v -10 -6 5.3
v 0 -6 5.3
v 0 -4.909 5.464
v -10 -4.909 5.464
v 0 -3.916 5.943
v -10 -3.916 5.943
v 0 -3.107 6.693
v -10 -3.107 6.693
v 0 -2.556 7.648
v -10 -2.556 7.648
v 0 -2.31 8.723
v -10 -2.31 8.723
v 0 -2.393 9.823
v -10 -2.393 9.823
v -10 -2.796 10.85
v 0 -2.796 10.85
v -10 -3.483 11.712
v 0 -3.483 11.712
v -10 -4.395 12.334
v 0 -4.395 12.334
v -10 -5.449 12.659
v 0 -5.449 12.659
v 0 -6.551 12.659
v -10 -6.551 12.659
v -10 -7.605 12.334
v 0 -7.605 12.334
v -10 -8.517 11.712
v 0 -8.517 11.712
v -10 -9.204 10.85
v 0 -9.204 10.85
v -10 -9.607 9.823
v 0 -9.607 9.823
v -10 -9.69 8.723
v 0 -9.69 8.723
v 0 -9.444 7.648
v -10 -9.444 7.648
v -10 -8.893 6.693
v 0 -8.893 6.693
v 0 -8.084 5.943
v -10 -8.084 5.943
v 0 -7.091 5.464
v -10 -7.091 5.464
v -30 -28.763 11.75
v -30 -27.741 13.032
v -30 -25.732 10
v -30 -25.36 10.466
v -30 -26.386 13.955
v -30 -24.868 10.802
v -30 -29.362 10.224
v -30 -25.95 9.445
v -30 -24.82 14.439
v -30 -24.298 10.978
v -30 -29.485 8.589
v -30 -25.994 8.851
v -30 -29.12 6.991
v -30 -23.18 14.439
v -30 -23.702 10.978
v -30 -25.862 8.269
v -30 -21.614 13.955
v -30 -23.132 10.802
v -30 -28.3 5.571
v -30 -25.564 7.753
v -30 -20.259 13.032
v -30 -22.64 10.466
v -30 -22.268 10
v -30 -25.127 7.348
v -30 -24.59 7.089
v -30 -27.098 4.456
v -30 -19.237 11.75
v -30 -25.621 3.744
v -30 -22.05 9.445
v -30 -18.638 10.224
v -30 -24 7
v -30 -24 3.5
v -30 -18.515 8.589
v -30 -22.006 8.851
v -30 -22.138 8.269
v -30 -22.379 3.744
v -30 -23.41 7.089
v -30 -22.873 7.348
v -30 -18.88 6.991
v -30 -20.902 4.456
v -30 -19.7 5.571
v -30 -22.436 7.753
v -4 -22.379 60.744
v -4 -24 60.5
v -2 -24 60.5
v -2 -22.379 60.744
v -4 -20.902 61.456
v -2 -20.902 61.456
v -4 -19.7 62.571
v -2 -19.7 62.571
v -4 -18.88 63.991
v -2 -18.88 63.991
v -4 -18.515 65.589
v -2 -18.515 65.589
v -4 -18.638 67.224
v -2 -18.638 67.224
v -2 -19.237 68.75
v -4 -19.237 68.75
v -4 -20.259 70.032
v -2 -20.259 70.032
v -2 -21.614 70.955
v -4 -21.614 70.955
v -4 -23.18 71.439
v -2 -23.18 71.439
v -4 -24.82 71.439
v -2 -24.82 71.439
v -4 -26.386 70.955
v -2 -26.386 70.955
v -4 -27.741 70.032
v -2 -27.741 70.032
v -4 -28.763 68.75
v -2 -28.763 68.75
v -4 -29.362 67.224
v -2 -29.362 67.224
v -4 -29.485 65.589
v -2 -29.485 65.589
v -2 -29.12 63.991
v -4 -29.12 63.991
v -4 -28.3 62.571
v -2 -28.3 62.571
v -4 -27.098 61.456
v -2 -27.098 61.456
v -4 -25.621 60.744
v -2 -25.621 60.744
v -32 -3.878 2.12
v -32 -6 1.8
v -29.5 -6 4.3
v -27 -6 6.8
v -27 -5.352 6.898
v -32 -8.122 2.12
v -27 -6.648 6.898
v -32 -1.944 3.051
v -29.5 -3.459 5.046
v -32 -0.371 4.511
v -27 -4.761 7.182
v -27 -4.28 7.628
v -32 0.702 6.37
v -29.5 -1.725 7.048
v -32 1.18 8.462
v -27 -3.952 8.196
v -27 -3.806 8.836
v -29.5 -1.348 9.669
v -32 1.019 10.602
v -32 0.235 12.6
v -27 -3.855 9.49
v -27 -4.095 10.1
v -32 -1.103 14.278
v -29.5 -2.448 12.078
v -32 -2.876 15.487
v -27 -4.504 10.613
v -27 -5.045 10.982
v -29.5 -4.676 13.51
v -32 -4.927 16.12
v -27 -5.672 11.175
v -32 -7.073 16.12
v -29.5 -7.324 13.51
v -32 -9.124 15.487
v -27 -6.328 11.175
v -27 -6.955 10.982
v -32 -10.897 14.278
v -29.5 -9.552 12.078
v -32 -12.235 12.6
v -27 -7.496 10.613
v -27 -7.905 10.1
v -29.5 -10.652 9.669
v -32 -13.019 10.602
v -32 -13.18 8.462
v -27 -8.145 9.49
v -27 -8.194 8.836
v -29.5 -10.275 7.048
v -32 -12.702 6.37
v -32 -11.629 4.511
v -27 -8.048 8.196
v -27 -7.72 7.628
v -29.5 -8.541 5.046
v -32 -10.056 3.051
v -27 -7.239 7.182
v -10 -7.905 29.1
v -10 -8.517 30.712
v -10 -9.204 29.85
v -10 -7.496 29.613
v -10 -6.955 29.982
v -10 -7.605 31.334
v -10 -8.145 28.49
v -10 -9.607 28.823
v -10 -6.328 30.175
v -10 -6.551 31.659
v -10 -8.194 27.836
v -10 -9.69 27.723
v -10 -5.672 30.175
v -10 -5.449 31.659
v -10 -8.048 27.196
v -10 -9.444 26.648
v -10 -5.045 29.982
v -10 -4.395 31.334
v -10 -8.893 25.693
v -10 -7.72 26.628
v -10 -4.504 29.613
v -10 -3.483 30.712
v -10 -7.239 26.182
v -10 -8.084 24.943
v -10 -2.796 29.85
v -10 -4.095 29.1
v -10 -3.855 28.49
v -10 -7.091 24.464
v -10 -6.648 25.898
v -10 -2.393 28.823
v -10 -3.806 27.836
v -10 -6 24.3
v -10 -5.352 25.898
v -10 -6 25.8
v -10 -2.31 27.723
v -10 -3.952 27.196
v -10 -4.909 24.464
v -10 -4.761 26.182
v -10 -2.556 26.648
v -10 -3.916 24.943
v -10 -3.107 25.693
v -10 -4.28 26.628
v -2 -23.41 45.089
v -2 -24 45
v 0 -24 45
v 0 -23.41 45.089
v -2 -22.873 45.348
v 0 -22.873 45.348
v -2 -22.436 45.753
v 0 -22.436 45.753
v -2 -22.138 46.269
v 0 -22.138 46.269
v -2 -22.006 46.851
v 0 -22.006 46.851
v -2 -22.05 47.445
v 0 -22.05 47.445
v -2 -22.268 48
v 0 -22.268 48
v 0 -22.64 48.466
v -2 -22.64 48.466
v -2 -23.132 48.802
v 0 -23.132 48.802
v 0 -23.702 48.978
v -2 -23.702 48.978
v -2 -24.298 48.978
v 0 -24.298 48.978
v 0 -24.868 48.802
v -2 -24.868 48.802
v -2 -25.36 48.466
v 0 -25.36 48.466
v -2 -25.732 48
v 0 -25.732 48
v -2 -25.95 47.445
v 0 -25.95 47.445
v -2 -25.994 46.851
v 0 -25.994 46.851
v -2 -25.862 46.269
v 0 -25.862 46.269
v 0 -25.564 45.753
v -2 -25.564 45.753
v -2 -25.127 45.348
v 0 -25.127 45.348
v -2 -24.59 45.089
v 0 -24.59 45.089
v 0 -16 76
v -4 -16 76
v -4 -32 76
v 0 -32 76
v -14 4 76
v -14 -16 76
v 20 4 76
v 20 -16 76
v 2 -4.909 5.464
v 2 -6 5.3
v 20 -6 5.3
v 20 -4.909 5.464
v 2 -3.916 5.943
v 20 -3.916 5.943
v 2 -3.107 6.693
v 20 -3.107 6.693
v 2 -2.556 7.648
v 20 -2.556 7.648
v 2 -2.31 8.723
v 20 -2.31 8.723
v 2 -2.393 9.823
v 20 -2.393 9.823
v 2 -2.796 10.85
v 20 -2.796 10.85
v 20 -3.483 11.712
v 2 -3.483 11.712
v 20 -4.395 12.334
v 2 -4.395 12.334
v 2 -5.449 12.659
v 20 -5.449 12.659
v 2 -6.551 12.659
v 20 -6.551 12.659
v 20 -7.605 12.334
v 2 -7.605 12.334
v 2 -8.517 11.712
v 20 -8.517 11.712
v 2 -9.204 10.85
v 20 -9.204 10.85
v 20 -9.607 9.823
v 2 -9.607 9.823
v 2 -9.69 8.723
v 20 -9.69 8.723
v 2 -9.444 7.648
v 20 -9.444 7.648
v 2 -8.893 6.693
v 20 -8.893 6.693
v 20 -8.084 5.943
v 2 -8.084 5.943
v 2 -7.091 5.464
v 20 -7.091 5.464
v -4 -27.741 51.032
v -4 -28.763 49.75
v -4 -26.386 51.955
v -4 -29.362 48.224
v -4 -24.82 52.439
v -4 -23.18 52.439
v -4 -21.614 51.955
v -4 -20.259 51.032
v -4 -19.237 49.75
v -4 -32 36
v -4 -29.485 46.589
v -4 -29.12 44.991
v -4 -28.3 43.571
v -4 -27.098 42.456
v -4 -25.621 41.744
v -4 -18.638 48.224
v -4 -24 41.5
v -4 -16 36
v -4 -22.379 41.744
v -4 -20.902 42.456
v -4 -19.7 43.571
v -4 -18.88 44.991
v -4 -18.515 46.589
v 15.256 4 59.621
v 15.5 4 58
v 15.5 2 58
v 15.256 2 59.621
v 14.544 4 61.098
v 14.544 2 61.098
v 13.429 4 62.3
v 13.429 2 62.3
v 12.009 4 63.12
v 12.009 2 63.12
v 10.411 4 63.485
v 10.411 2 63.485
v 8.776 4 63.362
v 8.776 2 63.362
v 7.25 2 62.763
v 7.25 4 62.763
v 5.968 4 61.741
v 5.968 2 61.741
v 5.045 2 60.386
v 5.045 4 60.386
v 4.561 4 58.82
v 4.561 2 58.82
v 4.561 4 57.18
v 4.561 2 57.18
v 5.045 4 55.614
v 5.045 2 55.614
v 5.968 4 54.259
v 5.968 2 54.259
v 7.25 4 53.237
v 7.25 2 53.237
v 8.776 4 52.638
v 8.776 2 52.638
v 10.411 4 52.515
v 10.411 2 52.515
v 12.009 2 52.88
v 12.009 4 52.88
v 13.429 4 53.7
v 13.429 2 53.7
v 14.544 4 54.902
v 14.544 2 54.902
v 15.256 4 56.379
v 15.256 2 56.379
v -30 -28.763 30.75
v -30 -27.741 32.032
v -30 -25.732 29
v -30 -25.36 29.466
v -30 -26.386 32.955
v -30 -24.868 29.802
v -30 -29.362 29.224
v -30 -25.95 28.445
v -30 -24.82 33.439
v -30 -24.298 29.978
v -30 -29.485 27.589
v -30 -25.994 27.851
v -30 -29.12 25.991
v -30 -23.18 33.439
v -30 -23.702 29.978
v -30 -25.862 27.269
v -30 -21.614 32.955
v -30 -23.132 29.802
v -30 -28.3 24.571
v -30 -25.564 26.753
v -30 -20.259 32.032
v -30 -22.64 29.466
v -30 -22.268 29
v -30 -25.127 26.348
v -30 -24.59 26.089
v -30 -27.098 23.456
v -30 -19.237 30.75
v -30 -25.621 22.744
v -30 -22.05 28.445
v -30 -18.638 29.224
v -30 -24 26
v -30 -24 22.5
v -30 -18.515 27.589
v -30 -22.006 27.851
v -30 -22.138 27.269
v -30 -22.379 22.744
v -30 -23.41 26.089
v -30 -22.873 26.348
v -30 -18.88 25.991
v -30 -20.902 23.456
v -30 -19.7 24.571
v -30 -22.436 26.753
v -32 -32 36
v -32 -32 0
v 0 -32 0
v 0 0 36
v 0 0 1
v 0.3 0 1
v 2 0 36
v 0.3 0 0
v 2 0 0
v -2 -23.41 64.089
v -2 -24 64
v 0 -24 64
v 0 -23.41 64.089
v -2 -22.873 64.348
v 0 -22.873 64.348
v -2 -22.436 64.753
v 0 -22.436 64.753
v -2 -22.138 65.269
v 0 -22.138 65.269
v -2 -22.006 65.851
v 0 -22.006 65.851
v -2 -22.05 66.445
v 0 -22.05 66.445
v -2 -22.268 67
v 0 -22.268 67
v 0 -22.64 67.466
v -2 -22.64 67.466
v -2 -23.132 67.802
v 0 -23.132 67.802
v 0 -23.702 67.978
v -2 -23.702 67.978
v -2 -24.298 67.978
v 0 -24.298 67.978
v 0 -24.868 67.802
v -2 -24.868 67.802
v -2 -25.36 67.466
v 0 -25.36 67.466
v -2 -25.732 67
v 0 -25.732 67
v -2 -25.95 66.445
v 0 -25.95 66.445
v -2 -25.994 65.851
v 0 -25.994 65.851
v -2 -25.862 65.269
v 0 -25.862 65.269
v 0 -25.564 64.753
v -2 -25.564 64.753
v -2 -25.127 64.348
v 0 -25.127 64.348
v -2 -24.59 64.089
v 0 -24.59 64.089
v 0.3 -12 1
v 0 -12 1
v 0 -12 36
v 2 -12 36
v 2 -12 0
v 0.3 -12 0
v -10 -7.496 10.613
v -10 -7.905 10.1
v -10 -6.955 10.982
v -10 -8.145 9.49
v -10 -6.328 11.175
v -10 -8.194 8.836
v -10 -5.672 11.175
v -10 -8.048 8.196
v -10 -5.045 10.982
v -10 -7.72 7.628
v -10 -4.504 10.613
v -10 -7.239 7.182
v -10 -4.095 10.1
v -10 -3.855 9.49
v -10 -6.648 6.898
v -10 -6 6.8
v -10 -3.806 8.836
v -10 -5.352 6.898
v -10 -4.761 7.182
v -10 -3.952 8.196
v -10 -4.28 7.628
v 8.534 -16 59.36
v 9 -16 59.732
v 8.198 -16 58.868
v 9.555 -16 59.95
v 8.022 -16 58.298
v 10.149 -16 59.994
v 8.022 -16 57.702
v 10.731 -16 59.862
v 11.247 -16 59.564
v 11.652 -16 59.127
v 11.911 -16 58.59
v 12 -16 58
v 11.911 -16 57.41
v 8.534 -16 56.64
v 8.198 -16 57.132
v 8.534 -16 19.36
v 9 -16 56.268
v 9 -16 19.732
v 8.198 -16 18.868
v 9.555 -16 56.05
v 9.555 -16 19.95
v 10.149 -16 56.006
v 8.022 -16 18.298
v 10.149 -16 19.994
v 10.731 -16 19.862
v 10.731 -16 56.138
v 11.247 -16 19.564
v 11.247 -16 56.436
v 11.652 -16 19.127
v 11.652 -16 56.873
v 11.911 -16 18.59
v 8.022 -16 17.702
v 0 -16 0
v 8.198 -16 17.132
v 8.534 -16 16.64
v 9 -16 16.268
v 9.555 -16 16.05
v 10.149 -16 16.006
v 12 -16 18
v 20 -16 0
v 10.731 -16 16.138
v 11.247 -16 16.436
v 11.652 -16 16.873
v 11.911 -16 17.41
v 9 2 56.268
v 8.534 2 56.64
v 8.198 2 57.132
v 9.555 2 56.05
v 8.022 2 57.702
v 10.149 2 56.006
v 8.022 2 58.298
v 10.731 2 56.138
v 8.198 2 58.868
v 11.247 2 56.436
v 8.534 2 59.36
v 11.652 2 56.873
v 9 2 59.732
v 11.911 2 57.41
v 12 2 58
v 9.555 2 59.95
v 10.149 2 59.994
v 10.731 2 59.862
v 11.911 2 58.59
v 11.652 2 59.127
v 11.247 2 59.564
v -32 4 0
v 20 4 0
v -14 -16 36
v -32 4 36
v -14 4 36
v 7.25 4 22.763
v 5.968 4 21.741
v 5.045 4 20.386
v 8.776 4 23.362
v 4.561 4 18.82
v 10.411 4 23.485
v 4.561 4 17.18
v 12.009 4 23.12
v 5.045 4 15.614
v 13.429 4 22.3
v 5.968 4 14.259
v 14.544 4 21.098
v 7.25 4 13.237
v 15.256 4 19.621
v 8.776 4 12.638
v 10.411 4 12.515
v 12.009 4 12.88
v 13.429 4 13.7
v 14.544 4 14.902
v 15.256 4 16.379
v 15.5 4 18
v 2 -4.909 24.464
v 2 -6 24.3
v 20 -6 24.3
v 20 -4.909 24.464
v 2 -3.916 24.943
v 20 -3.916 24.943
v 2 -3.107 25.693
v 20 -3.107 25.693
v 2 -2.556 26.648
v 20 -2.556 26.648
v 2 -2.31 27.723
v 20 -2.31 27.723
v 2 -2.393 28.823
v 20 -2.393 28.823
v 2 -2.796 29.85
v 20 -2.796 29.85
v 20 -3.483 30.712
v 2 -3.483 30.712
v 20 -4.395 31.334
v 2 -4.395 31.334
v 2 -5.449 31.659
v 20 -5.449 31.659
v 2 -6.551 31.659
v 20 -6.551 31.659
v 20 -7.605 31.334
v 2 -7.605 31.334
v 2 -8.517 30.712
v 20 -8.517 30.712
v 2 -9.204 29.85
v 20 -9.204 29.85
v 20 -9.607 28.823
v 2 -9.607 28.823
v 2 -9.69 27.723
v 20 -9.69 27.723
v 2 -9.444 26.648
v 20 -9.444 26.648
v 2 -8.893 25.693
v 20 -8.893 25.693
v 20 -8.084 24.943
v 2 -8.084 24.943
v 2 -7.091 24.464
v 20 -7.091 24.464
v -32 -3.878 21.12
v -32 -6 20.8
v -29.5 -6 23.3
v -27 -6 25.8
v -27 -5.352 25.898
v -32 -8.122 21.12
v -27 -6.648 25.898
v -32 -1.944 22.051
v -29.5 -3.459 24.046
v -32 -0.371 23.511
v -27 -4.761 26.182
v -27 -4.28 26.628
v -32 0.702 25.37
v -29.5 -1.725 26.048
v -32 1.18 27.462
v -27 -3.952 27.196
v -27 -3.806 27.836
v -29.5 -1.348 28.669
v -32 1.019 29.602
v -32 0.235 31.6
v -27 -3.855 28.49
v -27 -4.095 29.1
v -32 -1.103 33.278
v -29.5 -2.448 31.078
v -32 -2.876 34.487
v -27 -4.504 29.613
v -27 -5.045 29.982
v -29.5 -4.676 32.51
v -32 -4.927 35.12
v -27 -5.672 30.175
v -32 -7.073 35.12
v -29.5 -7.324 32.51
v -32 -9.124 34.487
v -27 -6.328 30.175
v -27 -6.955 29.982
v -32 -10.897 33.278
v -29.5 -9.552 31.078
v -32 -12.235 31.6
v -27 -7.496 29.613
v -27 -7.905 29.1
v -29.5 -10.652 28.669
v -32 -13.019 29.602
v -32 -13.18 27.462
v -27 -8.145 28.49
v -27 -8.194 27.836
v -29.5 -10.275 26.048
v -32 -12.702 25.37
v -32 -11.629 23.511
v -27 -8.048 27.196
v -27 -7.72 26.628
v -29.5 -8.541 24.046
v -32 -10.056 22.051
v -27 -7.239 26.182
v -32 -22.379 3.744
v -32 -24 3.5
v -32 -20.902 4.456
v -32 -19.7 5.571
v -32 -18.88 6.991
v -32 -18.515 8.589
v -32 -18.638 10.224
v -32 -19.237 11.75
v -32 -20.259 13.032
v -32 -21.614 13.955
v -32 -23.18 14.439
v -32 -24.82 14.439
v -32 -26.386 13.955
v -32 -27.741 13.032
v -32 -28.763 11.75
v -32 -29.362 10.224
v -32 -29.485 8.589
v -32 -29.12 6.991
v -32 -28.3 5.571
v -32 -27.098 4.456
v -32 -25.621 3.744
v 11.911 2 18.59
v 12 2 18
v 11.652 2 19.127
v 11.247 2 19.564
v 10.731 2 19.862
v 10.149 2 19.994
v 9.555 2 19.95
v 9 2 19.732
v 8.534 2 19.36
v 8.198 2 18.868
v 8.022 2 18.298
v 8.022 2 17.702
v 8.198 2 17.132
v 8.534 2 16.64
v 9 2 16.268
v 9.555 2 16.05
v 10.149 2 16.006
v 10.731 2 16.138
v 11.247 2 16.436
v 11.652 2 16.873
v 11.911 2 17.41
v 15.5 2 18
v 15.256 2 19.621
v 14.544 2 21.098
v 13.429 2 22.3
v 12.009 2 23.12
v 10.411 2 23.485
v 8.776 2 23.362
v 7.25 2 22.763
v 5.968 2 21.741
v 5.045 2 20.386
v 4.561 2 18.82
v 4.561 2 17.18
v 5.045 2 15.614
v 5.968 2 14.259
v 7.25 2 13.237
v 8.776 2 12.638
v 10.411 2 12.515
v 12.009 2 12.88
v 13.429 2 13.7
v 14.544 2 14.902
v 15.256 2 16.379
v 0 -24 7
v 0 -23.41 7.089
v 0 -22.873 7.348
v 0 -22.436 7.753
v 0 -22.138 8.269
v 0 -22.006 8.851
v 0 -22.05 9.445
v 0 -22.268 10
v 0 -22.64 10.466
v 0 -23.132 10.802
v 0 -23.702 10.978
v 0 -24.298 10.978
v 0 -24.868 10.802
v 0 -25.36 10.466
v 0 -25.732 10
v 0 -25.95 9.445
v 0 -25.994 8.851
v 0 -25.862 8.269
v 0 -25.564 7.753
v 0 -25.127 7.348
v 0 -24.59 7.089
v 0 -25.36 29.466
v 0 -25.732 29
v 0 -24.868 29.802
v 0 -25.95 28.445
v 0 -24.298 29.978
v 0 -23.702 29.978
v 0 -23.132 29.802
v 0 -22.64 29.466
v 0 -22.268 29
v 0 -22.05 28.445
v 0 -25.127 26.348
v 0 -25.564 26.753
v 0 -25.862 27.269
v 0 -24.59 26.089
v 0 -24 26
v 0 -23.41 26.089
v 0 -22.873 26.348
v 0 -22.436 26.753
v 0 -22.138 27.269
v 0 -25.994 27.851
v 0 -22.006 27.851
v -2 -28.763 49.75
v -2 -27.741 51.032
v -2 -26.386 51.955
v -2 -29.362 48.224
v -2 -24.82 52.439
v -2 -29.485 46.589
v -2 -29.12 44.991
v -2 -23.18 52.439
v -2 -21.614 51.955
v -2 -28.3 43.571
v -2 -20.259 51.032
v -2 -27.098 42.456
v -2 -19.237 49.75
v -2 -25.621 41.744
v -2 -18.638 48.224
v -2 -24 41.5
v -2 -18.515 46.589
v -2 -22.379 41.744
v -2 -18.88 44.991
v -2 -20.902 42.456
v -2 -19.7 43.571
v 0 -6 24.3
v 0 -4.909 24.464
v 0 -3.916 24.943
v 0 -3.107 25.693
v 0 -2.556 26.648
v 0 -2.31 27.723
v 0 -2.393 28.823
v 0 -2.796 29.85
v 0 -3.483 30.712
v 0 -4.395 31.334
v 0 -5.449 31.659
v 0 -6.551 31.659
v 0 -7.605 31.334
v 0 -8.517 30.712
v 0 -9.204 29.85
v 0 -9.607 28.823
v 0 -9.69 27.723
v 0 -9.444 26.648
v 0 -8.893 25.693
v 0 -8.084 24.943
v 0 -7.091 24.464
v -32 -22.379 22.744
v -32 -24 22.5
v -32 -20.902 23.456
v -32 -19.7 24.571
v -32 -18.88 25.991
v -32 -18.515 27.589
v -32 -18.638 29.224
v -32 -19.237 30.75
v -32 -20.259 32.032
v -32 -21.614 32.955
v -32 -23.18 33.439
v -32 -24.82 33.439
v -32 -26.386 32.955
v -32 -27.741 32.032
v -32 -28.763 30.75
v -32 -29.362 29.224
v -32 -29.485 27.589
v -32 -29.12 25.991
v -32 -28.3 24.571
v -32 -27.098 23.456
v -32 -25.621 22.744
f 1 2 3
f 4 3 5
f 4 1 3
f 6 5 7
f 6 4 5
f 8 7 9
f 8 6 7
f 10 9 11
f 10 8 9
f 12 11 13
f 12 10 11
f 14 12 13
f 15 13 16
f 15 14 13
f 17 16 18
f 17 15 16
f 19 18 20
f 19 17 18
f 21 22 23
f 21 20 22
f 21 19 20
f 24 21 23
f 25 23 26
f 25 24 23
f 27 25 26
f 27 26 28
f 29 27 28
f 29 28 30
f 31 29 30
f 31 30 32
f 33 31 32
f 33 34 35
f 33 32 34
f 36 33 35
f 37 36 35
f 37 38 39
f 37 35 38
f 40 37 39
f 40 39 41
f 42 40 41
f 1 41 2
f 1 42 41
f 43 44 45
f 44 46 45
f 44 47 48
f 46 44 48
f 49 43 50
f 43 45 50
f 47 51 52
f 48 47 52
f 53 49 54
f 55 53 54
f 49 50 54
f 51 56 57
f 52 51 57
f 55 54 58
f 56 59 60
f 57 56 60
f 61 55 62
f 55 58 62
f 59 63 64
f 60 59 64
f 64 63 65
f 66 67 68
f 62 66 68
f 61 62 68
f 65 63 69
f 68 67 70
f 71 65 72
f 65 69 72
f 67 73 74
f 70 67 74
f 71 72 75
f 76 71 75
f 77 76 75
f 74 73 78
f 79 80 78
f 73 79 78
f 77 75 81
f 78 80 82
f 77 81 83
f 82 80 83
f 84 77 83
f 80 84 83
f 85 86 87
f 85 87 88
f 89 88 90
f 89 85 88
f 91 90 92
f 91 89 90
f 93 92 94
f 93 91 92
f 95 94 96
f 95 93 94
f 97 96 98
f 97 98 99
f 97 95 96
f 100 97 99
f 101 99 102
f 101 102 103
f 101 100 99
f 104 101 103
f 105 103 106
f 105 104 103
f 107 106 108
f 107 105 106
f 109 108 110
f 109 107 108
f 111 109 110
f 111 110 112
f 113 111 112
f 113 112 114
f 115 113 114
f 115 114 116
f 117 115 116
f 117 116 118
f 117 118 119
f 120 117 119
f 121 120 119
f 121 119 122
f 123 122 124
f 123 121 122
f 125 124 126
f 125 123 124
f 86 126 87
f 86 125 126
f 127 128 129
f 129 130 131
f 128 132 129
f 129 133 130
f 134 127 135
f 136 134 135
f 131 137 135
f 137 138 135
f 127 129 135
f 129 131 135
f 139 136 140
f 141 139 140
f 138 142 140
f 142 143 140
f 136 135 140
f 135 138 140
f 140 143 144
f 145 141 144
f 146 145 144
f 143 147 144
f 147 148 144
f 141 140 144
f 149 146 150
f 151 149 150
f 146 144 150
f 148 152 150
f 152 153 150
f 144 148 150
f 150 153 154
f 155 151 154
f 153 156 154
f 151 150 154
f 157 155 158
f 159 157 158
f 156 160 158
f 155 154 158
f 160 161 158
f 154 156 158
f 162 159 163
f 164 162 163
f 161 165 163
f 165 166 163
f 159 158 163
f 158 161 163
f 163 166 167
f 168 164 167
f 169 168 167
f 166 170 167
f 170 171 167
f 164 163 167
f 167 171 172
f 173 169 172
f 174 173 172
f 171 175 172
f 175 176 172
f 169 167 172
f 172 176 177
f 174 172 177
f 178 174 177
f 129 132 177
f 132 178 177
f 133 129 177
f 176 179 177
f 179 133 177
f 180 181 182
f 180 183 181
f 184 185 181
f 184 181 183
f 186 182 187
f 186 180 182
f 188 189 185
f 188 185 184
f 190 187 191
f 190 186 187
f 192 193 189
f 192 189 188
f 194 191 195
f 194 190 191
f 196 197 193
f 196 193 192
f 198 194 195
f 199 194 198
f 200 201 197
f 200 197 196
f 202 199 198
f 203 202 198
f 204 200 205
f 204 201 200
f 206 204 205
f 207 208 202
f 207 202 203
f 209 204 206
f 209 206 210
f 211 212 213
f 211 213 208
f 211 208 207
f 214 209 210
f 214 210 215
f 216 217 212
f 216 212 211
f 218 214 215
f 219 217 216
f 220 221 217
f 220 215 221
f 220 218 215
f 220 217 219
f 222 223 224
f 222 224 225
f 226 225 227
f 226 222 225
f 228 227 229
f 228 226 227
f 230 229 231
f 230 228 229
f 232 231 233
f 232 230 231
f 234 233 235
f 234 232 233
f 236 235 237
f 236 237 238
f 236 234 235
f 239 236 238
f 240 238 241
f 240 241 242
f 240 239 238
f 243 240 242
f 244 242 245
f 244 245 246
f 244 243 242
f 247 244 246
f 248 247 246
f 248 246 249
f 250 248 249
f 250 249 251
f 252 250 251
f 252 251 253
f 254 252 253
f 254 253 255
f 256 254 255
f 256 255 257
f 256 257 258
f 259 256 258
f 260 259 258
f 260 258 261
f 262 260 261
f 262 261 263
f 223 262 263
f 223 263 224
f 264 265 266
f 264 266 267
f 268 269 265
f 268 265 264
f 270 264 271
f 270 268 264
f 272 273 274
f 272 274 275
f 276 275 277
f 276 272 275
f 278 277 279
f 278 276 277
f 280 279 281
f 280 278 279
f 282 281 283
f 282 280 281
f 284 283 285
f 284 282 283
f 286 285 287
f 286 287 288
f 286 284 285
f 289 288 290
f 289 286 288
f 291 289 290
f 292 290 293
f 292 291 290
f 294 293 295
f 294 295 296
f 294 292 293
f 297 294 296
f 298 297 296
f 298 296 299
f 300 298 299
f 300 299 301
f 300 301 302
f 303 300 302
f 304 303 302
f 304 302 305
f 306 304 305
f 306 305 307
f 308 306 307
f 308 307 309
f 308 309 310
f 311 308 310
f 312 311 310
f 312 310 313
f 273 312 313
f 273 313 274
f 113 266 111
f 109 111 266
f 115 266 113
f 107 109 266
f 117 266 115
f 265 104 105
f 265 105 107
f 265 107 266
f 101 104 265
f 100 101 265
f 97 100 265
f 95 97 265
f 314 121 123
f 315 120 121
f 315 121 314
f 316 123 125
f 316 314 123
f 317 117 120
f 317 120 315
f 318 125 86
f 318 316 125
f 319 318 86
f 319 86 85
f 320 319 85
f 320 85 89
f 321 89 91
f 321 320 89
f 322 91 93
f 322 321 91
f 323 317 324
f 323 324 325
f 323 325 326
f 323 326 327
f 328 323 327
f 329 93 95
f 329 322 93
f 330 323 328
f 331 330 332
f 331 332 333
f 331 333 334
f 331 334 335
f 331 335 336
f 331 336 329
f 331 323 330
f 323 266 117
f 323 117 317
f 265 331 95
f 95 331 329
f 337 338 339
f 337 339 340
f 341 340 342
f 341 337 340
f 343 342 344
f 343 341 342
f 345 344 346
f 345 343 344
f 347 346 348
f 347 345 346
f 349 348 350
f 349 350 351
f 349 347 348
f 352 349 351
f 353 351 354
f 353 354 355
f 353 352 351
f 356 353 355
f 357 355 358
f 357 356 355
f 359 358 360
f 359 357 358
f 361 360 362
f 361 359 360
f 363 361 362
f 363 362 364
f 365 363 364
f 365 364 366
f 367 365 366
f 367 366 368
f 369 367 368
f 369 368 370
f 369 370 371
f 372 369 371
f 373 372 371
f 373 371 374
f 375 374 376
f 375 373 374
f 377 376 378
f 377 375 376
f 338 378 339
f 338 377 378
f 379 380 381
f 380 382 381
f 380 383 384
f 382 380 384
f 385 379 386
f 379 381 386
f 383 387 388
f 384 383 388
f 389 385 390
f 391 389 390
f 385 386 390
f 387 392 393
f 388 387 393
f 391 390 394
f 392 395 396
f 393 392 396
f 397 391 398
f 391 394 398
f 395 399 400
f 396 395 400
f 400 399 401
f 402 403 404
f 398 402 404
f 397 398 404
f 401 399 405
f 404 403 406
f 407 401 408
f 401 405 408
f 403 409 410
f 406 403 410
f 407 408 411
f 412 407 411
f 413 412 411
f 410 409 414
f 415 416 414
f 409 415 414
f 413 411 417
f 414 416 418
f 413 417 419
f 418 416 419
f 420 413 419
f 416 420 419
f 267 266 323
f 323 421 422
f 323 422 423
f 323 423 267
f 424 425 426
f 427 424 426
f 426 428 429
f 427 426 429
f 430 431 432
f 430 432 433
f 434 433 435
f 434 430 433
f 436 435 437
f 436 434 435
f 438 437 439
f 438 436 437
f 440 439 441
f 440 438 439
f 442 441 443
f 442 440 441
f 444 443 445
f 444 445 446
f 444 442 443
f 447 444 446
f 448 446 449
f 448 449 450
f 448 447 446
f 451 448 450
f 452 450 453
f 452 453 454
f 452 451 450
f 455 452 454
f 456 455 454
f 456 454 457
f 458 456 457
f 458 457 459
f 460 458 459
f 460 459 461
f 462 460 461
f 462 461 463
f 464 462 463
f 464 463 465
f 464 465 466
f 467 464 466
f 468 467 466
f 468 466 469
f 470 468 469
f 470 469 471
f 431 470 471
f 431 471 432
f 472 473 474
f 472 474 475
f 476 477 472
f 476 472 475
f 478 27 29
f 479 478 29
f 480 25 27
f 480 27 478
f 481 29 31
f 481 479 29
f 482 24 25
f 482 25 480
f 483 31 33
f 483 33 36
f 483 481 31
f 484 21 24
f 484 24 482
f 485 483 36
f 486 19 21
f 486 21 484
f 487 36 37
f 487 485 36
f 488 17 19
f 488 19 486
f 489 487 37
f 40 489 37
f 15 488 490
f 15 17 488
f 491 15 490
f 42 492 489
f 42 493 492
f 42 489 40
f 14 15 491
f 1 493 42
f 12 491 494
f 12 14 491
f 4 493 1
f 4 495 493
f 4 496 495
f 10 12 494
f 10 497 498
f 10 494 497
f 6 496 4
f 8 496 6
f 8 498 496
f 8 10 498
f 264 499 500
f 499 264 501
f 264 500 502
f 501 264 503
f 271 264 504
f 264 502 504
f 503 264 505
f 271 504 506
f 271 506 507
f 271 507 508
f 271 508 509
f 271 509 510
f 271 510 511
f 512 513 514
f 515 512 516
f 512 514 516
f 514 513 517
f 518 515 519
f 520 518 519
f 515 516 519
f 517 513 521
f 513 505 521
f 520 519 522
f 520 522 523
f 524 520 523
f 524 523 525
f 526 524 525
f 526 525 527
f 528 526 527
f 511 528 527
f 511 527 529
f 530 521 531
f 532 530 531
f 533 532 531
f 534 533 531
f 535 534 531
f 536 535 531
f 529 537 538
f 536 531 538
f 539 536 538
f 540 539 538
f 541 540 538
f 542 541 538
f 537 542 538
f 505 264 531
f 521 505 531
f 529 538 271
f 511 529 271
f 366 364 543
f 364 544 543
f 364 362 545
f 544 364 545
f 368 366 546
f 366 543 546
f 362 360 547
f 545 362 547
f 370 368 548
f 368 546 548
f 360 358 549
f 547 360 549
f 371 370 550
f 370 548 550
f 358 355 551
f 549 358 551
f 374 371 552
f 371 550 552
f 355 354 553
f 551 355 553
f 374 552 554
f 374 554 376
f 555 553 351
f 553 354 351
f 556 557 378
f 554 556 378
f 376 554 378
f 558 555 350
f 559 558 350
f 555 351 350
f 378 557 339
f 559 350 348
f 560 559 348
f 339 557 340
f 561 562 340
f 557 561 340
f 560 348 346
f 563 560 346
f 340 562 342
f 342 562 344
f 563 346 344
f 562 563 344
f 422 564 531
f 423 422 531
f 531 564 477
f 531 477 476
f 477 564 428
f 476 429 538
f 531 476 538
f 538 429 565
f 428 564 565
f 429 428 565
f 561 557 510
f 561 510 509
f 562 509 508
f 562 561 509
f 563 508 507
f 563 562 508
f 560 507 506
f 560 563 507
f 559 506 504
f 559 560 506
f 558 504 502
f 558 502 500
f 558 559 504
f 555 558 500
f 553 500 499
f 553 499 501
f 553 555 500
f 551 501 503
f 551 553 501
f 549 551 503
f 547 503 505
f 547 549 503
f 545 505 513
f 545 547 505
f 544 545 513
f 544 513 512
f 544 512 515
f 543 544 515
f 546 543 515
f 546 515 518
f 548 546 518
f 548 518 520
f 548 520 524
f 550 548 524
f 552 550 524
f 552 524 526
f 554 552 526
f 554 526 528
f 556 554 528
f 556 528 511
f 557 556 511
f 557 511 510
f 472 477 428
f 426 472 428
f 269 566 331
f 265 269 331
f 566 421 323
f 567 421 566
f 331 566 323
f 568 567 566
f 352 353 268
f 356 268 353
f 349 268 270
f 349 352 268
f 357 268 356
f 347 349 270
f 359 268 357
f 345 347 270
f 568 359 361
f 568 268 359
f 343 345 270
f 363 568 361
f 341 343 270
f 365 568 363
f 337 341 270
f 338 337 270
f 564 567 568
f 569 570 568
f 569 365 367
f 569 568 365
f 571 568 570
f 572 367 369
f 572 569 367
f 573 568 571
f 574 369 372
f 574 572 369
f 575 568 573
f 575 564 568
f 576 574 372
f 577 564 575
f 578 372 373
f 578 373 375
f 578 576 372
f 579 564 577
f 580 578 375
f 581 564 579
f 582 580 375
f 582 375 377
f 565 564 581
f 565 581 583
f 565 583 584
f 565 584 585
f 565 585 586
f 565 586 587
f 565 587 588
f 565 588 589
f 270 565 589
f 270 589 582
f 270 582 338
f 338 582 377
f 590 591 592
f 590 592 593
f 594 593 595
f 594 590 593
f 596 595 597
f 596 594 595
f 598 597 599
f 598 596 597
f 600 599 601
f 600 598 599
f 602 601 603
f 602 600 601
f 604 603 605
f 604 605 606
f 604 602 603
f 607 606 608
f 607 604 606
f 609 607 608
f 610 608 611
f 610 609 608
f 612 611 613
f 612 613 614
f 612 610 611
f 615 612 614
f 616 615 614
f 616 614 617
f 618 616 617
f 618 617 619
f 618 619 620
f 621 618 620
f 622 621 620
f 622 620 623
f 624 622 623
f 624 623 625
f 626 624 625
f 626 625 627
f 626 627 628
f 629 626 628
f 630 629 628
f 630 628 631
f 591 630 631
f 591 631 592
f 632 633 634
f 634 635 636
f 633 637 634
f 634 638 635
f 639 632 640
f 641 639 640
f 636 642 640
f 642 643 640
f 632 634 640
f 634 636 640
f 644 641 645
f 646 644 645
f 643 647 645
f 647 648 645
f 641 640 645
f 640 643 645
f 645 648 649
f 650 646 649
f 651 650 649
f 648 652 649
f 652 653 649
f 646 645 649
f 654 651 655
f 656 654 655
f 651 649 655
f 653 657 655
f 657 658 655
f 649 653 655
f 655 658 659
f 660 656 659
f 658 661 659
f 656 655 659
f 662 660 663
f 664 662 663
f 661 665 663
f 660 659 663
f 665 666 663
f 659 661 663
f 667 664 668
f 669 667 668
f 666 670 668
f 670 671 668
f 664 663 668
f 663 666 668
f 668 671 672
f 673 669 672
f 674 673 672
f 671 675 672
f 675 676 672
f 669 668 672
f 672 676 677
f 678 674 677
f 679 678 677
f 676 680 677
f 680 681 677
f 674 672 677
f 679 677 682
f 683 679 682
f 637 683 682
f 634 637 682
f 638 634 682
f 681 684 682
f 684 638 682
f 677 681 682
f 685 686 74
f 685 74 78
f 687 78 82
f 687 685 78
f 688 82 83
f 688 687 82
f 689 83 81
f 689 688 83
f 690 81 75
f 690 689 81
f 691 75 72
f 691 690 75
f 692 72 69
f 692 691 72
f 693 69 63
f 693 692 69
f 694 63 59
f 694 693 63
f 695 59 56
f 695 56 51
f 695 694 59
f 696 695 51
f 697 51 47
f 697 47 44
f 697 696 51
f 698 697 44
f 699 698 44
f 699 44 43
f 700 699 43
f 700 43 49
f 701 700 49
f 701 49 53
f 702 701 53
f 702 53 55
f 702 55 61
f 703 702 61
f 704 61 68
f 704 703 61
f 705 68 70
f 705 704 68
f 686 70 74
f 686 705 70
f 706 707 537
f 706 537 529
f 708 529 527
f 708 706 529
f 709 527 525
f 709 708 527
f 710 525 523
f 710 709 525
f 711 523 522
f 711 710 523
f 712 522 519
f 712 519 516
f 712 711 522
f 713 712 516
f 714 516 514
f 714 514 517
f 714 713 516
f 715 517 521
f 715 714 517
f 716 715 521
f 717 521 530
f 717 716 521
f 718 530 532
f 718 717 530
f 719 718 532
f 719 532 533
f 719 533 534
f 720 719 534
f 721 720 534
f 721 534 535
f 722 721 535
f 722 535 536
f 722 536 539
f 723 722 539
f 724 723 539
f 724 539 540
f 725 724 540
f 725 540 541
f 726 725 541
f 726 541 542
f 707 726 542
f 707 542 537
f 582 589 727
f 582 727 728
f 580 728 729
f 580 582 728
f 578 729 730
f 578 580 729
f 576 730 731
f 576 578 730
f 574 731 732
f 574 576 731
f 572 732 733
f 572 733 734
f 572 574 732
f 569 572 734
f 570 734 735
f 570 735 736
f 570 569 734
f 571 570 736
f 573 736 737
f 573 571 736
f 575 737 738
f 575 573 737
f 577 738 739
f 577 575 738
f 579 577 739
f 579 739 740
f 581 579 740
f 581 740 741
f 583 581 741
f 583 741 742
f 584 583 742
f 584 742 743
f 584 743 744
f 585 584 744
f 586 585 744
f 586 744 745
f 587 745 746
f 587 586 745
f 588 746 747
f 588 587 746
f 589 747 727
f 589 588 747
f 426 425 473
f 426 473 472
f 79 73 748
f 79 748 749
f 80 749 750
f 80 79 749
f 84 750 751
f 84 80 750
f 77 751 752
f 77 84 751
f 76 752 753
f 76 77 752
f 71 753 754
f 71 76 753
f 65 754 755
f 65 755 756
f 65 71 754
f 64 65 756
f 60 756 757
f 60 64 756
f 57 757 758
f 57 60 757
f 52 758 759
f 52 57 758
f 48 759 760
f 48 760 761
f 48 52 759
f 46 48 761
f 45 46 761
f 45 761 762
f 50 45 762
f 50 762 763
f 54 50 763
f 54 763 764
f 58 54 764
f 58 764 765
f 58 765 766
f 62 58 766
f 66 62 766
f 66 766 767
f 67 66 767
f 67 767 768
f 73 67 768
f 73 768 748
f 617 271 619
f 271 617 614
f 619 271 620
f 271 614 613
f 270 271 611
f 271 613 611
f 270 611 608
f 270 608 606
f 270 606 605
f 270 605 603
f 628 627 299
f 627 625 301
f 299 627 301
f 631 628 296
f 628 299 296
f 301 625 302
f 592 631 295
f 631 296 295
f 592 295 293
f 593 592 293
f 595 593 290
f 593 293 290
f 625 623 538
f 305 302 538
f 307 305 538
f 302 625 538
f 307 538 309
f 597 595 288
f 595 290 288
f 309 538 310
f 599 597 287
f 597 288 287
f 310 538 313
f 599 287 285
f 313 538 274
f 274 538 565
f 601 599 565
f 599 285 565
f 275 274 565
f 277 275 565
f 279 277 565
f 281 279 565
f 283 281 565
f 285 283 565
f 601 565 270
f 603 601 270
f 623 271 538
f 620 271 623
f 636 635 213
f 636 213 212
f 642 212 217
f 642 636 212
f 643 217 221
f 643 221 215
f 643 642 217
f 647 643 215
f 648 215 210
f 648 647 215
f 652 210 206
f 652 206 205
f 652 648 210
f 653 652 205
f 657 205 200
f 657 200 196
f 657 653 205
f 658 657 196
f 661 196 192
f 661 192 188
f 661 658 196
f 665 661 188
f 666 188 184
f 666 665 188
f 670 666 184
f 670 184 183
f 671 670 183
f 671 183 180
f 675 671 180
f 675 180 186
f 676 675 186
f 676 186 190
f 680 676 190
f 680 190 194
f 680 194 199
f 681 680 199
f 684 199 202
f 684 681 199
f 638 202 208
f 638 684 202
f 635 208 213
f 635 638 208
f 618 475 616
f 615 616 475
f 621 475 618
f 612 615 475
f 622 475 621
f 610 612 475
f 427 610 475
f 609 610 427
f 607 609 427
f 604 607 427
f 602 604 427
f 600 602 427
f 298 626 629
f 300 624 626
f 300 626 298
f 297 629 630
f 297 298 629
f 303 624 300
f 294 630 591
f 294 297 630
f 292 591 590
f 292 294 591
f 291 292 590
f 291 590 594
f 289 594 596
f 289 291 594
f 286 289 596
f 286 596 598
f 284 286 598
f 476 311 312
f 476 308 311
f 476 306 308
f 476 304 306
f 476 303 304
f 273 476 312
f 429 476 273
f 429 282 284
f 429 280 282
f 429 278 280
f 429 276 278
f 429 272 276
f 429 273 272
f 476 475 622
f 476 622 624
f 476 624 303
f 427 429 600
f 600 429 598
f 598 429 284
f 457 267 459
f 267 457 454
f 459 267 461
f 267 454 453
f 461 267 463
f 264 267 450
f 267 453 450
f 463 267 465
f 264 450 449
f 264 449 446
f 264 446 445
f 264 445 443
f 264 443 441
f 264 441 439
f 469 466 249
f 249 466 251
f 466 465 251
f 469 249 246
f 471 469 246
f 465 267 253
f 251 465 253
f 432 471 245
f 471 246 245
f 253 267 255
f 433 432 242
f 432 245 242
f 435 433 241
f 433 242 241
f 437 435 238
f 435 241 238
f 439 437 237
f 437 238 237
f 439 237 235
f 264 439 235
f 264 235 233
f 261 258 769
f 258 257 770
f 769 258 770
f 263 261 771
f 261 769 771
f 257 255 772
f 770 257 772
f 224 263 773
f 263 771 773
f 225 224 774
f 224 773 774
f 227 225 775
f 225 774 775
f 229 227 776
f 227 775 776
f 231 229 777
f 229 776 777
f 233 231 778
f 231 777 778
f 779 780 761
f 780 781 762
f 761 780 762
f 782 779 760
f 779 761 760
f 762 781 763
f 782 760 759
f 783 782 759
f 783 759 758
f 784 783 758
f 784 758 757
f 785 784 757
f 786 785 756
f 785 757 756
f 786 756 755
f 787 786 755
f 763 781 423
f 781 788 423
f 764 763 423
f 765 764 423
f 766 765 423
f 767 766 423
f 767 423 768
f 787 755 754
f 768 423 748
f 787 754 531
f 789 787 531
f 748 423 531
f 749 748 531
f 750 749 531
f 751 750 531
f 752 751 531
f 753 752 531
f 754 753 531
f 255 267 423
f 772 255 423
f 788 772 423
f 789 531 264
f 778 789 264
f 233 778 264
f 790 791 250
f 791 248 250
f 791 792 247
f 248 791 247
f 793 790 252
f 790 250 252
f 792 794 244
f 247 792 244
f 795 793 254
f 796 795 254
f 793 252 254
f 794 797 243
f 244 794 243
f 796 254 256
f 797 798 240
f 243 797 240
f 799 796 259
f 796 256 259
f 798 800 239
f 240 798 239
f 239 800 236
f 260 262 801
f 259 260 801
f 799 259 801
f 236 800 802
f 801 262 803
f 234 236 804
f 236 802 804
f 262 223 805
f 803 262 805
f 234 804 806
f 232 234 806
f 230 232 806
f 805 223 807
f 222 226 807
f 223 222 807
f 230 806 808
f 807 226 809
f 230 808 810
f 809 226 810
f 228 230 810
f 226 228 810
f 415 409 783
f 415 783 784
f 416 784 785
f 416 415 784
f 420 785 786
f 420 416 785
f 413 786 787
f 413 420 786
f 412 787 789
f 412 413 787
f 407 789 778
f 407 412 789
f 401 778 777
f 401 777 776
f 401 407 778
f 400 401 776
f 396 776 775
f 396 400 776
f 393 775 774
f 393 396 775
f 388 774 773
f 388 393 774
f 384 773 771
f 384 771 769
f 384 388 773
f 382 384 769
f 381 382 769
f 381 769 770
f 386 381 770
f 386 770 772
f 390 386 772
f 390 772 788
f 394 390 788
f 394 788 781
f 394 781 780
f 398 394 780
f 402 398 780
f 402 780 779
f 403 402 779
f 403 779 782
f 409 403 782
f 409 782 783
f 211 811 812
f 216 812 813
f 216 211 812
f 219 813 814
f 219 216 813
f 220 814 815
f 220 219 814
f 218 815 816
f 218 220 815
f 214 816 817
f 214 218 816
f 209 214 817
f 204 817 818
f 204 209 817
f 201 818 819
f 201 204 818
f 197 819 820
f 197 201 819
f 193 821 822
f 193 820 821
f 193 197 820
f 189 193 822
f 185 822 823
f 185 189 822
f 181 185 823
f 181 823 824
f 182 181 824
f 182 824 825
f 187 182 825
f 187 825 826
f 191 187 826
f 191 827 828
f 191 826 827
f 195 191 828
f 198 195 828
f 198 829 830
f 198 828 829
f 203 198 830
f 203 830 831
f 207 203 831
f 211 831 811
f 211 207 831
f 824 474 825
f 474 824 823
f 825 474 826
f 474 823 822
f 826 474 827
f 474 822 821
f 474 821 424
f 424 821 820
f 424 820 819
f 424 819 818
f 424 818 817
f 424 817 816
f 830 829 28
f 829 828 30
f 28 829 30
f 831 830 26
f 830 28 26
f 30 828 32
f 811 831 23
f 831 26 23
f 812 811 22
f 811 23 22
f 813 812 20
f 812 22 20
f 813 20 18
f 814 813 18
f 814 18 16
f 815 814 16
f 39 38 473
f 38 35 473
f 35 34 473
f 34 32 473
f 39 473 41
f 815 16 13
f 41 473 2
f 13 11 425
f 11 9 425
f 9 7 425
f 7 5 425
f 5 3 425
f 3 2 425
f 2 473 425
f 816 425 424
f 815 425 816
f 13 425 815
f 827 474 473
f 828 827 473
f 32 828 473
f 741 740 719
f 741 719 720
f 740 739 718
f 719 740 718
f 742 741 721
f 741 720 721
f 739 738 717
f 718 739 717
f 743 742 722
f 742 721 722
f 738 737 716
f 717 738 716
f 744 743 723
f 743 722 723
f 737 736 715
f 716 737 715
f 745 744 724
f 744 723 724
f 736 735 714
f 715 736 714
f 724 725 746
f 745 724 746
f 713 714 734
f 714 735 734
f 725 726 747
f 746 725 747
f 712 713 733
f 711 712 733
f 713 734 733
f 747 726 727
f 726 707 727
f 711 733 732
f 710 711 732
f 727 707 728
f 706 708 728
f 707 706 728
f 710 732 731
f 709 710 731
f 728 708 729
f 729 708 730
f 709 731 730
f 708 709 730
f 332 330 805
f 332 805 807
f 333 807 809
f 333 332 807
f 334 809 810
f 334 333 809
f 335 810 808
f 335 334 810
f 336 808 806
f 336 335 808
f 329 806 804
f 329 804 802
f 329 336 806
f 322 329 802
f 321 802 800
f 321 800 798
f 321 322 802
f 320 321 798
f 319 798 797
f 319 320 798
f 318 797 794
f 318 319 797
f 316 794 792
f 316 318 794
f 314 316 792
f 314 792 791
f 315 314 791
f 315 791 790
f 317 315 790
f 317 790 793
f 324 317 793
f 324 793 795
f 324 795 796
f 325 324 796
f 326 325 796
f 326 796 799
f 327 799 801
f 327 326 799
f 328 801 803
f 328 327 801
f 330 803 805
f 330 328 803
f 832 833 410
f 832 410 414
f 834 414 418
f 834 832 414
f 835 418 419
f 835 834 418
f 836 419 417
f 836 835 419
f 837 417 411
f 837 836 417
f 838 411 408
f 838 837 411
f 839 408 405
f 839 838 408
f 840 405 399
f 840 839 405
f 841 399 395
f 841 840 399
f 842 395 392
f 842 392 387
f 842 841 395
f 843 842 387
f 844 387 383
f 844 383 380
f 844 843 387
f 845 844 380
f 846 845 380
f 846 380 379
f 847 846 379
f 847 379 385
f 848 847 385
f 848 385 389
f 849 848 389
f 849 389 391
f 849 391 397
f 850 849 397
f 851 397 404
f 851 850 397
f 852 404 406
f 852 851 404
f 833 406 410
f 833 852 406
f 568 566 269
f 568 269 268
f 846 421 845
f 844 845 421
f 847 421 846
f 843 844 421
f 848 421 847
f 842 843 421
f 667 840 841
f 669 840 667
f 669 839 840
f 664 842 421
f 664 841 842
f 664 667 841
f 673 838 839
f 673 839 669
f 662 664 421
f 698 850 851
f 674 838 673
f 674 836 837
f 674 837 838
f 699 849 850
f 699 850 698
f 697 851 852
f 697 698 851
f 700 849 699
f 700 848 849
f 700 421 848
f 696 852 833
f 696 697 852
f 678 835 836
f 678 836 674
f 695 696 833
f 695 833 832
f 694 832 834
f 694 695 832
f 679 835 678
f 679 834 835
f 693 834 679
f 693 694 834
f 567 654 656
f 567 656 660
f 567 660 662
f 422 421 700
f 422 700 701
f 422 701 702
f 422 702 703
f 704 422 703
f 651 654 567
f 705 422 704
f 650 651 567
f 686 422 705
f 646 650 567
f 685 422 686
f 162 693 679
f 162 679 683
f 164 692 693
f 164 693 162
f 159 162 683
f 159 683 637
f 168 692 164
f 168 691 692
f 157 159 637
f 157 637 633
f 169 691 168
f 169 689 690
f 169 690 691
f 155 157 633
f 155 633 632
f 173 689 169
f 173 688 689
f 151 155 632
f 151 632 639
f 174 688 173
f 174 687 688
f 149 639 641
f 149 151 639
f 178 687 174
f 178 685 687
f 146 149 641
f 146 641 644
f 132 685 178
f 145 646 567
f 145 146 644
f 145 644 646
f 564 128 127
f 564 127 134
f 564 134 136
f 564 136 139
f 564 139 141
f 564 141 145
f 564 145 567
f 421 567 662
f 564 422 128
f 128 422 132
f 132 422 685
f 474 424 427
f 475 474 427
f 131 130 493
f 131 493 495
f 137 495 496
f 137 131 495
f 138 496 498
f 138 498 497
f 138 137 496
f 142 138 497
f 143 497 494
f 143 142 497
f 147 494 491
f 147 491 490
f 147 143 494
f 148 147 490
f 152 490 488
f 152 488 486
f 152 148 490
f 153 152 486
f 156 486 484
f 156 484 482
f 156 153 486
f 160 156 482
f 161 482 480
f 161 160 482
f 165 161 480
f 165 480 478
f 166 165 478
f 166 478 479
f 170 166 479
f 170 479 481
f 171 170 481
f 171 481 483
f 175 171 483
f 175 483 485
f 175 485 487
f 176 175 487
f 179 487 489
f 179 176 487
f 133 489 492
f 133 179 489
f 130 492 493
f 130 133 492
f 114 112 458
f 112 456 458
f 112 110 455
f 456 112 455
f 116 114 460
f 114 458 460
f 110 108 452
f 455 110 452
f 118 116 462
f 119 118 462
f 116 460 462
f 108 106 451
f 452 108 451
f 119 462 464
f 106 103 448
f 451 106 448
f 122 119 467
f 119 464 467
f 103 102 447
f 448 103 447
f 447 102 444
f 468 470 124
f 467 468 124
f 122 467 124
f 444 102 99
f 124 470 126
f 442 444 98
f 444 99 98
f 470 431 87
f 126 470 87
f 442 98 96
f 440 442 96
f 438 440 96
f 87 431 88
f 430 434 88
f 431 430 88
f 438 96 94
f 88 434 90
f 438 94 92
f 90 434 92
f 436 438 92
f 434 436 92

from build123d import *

# Parameters (mm, degrees)
CYLINDER007_R     = 5.5
CYLINDER007_DEPTH = 2
CYLINDER001_R     = 2
CYLINDER001_DEPTH = 32
CYLINDER006_R     = 5.5
CYLINDER006_DEPTH = 2
CYLINDER_R        = 2
CYLINDER_DEPTH    = 32
CYLINDER011_R     = 2
CYLINDER011_DEPTH = 20
CYLINDER013_R     = 5.5
CYLINDER013_DEPTH = 2
CYLINDER008_R     = 5.5
CYLINDER008_DEPTH = 2
CYLINDER002_R     = 2
CYLINDER002_DEPTH = 4
CYLINDER012_R     = 2
CYLINDER012_DEPTH = 20
CYLINDER010_R     = 5.5
CYLINDER010_DEPTH = 2
CYLINDER009_R     = 5.5
CYLINDER009_DEPTH = 2
CYLINDER003_R     = 2
CYLINDER003_DEPTH = 4
CYLINDER004_R     = 2.2
CYLINDER004_DEPTH = 22
CYLINDER015_R     = 3.7
CYLINDER015_DEPTH = 30
CYLINDER014_R     = 3.7
CYLINDER014_DEPTH = 30
CYLINDER005_R     = 2.2
CYLINDER005_DEPTH = 22
BOX002_W          = 20
BOX002_H          = 4
BOX002_DEPTH      = 76
BOX005_W          = 20
BOX005_H          = 12
BOX005_DEPTH      = 40
BOX011_W          = 18
BOX011_H          = 12
BOX011_DEPTH      = 36
BOX009_W          = 0.3
BOX009_H          = 12
BOX009_DEPTH      = 1
BOX_W             = 20
BOX_H             = 4
BOX_DEPTH         = 76
BOX012_W          = 10
BOX012_H          = 20
BOX012_DEPTH      = 40
BOX010_W          = 28
BOX010_H          = 36
BOX010_DEPTH      = 36
BOX001_W          = 4
BOX001_H          = 36
BOX001_DEPTH      = 76
CHAMFER_SIZE      = 5


with BuildPart() as cylinder007:
    # Cylinder007 → Cylinder007 (new body)
    with BuildSketch(Plane(origin=(-24, -24, 28), x_dir=(0, 0, -1), z_dir=(1, 0, 0))):
        Circle(CYLINDER007_R)
    extrude(amount=CYLINDER007_DEPTH)


with BuildPart() as fusion:
    # Cylinder001 → Cylinder001 (new body)
    with BuildSketch(Plane(origin=(-24, -24, 28), x_dir=(0, 0, -1), z_dir=(1, 0, 0))):
        Circle(CYLINDER001_R)
    extrude(amount=CYLINDER001_DEPTH)

    # Fusion: union Cylinder007
    add(cylinder007.part)


with BuildPart() as fusion_1:
    # Fusion placement: moved
    add(fusion.part.moved(Location((-8, 0, 0))))


with BuildPart() as cylinder006:
    # Cylinder006 → Cylinder006 (new body)
    with BuildSketch(Plane(origin=(-24, -24, 9), x_dir=(0, 0, -1), z_dir=(1, 0, 0))):
        Circle(CYLINDER006_R)
    extrude(amount=CYLINDER006_DEPTH)


with BuildPart() as fusion005:
    # Cylinder → Cylinder (new body)
    with BuildSketch(Plane(origin=(-24, -24, 9), x_dir=(0, 0, -1), z_dir=(1, 0, 0))):
        Circle(CYLINDER_R)
    extrude(amount=CYLINDER_DEPTH)

    # Fusion005: union Cylinder006
    add(cylinder006.part)


with BuildPart() as fusion005_1:
    # Fusion005 placement: moved
    add(fusion005.part.moved(Location((-8, 0, 0))))


with BuildPart() as cylinder011:
    # Cylinder011 → Cylinder011 (new body)
    with BuildSketch(Plane(origin=(10, 4, 58), x_dir=(1, 0, 0), z_dir=(0, -1, 0))):
        Circle(CYLINDER011_R)
    extrude(amount=CYLINDER011_DEPTH)


with BuildPart() as fusion012:
    # Cylinder013 → Cylinder013 (new body)
    with BuildSketch(Plane(origin=(10, 4, 58), x_dir=(1, 0, 0), z_dir=(0, -1, 0))):
        Circle(CYLINDER013_R)
    extrude(amount=CYLINDER013_DEPTH)

    # Fusion012: union Cylinder011
    add(cylinder011.part)


with BuildPart() as cylinder008:
    # Cylinder008 → Cylinder008 (new body)
    with BuildSketch(Plane(origin=(-4, -24, 47), x_dir=(0, 0, -1), z_dir=(1, 0, 0))):
        Circle(CYLINDER008_R)
    extrude(amount=CYLINDER008_DEPTH)


with BuildPart() as fusion007:
    # Cylinder002 → Cylinder002 (new body)
    with BuildSketch(Plane(origin=(-4, -24, 47), x_dir=(0, 0, -1), z_dir=(1, 0, 0))):
        Circle(CYLINDER002_R)
    extrude(amount=CYLINDER002_DEPTH)

    # Fusion007: union Cylinder008
    add(cylinder008.part)


with BuildPart() as cylinder012:
    # Cylinder012 → Cylinder012 (new body)
    with BuildSketch(Plane(origin=(10, 4, 18), x_dir=(1, 0, 0), z_dir=(0, -1, 0))):
        Circle(CYLINDER012_R)
    extrude(amount=CYLINDER012_DEPTH)


with BuildPart() as fusion011:
    # Cylinder010 → Cylinder010 (new body)
    with BuildSketch(Plane(origin=(10, 4, 18), x_dir=(1, 0, 0), z_dir=(0, -1, 0))):
        Circle(CYLINDER010_R)
    extrude(amount=CYLINDER010_DEPTH)

    # Fusion011: union Cylinder012
    add(cylinder012.part)


with BuildPart() as cylinder009:
    # Cylinder009 → Cylinder009 (new body)
    with BuildSketch(Plane(origin=(-4, -24, 66), x_dir=(0, 0, -1), z_dir=(1, 0, 0))):
        Circle(CYLINDER009_R)
    extrude(amount=CYLINDER009_DEPTH)


with BuildPart() as fusion006:
    # Cylinder003 → Cylinder003 (new body)
    with BuildSketch(Plane(origin=(-4, -24, 66), x_dir=(0, 0, -1), z_dir=(1, 0, 0))):
        Circle(CYLINDER003_R)
    extrude(amount=CYLINDER003_DEPTH)

    # Fusion006: union Cylinder009
    add(cylinder009.part)


with BuildPart() as cylinder004:
    # Cylinder004 → Cylinder004 (new body)
    with BuildSketch(Plane(origin=(-32, -6, 9), x_dir=(0, 0, -1), z_dir=(1, 0, 0))):
        Circle(CYLINDER004_R)
    extrude(amount=CYLINDER004_DEPTH)


with BuildPart() as fusion013:
    # Cylinder015 → Cylinder015 (new body)
    with BuildSketch(Plane(origin=(-10, -6, 9), x_dir=(0, 0, -1), z_dir=(1, 0, 0))):
        Circle(CYLINDER015_R)
    extrude(amount=CYLINDER015_DEPTH)

    # Fusion013: union Cylinder004
    add(cylinder004.part)


with BuildPart() as cylinder014:
    # Cylinder014 → Cylinder014 (new body)
    with BuildSketch(Plane(origin=(-10, -6, 28), x_dir=(0, 0, -1), z_dir=(1, 0, 0))):
        Circle(CYLINDER014_R)
    extrude(amount=CYLINDER014_DEPTH)


with BuildPart() as fusion014:
    # Cylinder005 → Cylinder005 (new body)
    with BuildSketch(Plane(origin=(-32, -6, 28), x_dir=(0, 0, -1), z_dir=(1, 0, 0))):
        Circle(CYLINDER005_R)
    extrude(amount=CYLINDER005_DEPTH)

    # Fusion014: union Cylinder014
    add(cylinder014.part)


with BuildPart() as cube002:
    # Box002 → Box002 (new body)
    with BuildSketch(Plane(origin=(0, -16, 0), x_dir=(1, 0, 0), z_dir=(0, 0, 1))):
        with Locations((10, 2)):
            Rectangle(BOX002_W, BOX002_H)
    extrude(amount=BOX002_DEPTH)


with BuildPart() as cube005:
    # Box005 → Box005 (new body)
    with BuildSketch(Plane(origin=(0, -12, 36), x_dir=(1, 0, 0), z_dir=(0, 0, 1))):
        with Locations((10, 6)):
            Rectangle(BOX005_W, BOX005_H)
    extrude(amount=BOX005_DEPTH)


with BuildPart() as cube011:
    # Box011 → Box011 (new body)
    with BuildSketch(Plane(origin=(2, -12, 0), x_dir=(1, 0, 0), z_dir=(0, 0, 1))):
        with Locations((9, 6)):
            Rectangle(BOX011_W, BOX011_H)
    extrude(amount=BOX011_DEPTH)


with BuildPart() as cube009:
    # Box009 → Box009 (new body)
    with BuildSketch(Plane(origin=(0, -12, 0), x_dir=(1, 0, 0), z_dir=(0, 0, 1))):
        with Locations((0.15, 6)):
            Rectangle(BOX009_W, BOX009_H)
    extrude(amount=BOX009_DEPTH)


with BuildPart() as cube:
    # Box → Box (new body)
    with BuildSketch(Plane.XY):
        with Locations((10, 2)):
            Rectangle(BOX_W, BOX_H)
    extrude(amount=BOX_DEPTH)


with BuildPart() as cube012:
    # Box012 → Box012 (new body)
    with BuildSketch(Plane(origin=(-14, -16, 36), x_dir=(1, 0, 0), z_dir=(0, 0, 1))):
        with Locations((5, 10)):
            Rectangle(BOX012_W, BOX012_H)
    extrude(amount=BOX012_DEPTH)


with BuildPart() as cube010:
    # Box010 → Box010 (new body)
    with BuildSketch(Plane(origin=(-32, -32, 0), x_dir=(1, 0, 0), z_dir=(0, 0, 1))):
        with Locations((14, 18)):
            Rectangle(BOX010_W, BOX010_H)
    extrude(amount=BOX010_DEPTH)


with BuildPart() as chamfer_body:
    # Box001 → Box001 (new body)
    with BuildSketch(Plane(origin=(-4, -32, 0), x_dir=(1, 0, 0), z_dir=(0, 0, 1))):
        with Locations((2, 18)):
            Rectangle(BOX001_W, BOX001_H)
    extrude(amount=BOX001_DEPTH)

    # Fusion015: union Cube002, Cube005, Cube011, Cube009, Cube, Cube012, Cube010
    add(cube002.part)
    add(cube005.part)
    add(cube011.part)
    add(cube009.part)
    add(cube.part)
    add(cube012.part)
    add(cube010.part)

    # Cut: cut Fusion014
    add(fusion014.part, mode=Mode.SUBTRACT)

    # Cut001: cut Fusion013
    add(fusion013.part, mode=Mode.SUBTRACT)

    # Cut002: cut Fusion006
    add(fusion006.part, mode=Mode.SUBTRACT)

    # Cut003: cut Fusion011
    add(fusion011.part, mode=Mode.SUBTRACT)

    # Cut004: cut Fusion007
    add(fusion007.part, mode=Mode.SUBTRACT)

    # Cut005: cut Fusion012
    add(fusion012.part, mode=Mode.SUBTRACT)

    # Cut006: cut Fusion005
    add(fusion005_1.part, mode=Mode.SUBTRACT)

    # Cut007: cut Fusion
    add(fusion_1.part, mode=Mode.SUBTRACT)

    # Chamfer
    chamfer_edges = [chamfer_body.edges().sort_by_distance(p)[0] for p in [
        (-32, -6, 11.2),
        (-32, -6, 30.2),
    ]]
    chamfer(chamfer_edges, length=CHAMFER_SIZE)


solid = chamfer_body.part
